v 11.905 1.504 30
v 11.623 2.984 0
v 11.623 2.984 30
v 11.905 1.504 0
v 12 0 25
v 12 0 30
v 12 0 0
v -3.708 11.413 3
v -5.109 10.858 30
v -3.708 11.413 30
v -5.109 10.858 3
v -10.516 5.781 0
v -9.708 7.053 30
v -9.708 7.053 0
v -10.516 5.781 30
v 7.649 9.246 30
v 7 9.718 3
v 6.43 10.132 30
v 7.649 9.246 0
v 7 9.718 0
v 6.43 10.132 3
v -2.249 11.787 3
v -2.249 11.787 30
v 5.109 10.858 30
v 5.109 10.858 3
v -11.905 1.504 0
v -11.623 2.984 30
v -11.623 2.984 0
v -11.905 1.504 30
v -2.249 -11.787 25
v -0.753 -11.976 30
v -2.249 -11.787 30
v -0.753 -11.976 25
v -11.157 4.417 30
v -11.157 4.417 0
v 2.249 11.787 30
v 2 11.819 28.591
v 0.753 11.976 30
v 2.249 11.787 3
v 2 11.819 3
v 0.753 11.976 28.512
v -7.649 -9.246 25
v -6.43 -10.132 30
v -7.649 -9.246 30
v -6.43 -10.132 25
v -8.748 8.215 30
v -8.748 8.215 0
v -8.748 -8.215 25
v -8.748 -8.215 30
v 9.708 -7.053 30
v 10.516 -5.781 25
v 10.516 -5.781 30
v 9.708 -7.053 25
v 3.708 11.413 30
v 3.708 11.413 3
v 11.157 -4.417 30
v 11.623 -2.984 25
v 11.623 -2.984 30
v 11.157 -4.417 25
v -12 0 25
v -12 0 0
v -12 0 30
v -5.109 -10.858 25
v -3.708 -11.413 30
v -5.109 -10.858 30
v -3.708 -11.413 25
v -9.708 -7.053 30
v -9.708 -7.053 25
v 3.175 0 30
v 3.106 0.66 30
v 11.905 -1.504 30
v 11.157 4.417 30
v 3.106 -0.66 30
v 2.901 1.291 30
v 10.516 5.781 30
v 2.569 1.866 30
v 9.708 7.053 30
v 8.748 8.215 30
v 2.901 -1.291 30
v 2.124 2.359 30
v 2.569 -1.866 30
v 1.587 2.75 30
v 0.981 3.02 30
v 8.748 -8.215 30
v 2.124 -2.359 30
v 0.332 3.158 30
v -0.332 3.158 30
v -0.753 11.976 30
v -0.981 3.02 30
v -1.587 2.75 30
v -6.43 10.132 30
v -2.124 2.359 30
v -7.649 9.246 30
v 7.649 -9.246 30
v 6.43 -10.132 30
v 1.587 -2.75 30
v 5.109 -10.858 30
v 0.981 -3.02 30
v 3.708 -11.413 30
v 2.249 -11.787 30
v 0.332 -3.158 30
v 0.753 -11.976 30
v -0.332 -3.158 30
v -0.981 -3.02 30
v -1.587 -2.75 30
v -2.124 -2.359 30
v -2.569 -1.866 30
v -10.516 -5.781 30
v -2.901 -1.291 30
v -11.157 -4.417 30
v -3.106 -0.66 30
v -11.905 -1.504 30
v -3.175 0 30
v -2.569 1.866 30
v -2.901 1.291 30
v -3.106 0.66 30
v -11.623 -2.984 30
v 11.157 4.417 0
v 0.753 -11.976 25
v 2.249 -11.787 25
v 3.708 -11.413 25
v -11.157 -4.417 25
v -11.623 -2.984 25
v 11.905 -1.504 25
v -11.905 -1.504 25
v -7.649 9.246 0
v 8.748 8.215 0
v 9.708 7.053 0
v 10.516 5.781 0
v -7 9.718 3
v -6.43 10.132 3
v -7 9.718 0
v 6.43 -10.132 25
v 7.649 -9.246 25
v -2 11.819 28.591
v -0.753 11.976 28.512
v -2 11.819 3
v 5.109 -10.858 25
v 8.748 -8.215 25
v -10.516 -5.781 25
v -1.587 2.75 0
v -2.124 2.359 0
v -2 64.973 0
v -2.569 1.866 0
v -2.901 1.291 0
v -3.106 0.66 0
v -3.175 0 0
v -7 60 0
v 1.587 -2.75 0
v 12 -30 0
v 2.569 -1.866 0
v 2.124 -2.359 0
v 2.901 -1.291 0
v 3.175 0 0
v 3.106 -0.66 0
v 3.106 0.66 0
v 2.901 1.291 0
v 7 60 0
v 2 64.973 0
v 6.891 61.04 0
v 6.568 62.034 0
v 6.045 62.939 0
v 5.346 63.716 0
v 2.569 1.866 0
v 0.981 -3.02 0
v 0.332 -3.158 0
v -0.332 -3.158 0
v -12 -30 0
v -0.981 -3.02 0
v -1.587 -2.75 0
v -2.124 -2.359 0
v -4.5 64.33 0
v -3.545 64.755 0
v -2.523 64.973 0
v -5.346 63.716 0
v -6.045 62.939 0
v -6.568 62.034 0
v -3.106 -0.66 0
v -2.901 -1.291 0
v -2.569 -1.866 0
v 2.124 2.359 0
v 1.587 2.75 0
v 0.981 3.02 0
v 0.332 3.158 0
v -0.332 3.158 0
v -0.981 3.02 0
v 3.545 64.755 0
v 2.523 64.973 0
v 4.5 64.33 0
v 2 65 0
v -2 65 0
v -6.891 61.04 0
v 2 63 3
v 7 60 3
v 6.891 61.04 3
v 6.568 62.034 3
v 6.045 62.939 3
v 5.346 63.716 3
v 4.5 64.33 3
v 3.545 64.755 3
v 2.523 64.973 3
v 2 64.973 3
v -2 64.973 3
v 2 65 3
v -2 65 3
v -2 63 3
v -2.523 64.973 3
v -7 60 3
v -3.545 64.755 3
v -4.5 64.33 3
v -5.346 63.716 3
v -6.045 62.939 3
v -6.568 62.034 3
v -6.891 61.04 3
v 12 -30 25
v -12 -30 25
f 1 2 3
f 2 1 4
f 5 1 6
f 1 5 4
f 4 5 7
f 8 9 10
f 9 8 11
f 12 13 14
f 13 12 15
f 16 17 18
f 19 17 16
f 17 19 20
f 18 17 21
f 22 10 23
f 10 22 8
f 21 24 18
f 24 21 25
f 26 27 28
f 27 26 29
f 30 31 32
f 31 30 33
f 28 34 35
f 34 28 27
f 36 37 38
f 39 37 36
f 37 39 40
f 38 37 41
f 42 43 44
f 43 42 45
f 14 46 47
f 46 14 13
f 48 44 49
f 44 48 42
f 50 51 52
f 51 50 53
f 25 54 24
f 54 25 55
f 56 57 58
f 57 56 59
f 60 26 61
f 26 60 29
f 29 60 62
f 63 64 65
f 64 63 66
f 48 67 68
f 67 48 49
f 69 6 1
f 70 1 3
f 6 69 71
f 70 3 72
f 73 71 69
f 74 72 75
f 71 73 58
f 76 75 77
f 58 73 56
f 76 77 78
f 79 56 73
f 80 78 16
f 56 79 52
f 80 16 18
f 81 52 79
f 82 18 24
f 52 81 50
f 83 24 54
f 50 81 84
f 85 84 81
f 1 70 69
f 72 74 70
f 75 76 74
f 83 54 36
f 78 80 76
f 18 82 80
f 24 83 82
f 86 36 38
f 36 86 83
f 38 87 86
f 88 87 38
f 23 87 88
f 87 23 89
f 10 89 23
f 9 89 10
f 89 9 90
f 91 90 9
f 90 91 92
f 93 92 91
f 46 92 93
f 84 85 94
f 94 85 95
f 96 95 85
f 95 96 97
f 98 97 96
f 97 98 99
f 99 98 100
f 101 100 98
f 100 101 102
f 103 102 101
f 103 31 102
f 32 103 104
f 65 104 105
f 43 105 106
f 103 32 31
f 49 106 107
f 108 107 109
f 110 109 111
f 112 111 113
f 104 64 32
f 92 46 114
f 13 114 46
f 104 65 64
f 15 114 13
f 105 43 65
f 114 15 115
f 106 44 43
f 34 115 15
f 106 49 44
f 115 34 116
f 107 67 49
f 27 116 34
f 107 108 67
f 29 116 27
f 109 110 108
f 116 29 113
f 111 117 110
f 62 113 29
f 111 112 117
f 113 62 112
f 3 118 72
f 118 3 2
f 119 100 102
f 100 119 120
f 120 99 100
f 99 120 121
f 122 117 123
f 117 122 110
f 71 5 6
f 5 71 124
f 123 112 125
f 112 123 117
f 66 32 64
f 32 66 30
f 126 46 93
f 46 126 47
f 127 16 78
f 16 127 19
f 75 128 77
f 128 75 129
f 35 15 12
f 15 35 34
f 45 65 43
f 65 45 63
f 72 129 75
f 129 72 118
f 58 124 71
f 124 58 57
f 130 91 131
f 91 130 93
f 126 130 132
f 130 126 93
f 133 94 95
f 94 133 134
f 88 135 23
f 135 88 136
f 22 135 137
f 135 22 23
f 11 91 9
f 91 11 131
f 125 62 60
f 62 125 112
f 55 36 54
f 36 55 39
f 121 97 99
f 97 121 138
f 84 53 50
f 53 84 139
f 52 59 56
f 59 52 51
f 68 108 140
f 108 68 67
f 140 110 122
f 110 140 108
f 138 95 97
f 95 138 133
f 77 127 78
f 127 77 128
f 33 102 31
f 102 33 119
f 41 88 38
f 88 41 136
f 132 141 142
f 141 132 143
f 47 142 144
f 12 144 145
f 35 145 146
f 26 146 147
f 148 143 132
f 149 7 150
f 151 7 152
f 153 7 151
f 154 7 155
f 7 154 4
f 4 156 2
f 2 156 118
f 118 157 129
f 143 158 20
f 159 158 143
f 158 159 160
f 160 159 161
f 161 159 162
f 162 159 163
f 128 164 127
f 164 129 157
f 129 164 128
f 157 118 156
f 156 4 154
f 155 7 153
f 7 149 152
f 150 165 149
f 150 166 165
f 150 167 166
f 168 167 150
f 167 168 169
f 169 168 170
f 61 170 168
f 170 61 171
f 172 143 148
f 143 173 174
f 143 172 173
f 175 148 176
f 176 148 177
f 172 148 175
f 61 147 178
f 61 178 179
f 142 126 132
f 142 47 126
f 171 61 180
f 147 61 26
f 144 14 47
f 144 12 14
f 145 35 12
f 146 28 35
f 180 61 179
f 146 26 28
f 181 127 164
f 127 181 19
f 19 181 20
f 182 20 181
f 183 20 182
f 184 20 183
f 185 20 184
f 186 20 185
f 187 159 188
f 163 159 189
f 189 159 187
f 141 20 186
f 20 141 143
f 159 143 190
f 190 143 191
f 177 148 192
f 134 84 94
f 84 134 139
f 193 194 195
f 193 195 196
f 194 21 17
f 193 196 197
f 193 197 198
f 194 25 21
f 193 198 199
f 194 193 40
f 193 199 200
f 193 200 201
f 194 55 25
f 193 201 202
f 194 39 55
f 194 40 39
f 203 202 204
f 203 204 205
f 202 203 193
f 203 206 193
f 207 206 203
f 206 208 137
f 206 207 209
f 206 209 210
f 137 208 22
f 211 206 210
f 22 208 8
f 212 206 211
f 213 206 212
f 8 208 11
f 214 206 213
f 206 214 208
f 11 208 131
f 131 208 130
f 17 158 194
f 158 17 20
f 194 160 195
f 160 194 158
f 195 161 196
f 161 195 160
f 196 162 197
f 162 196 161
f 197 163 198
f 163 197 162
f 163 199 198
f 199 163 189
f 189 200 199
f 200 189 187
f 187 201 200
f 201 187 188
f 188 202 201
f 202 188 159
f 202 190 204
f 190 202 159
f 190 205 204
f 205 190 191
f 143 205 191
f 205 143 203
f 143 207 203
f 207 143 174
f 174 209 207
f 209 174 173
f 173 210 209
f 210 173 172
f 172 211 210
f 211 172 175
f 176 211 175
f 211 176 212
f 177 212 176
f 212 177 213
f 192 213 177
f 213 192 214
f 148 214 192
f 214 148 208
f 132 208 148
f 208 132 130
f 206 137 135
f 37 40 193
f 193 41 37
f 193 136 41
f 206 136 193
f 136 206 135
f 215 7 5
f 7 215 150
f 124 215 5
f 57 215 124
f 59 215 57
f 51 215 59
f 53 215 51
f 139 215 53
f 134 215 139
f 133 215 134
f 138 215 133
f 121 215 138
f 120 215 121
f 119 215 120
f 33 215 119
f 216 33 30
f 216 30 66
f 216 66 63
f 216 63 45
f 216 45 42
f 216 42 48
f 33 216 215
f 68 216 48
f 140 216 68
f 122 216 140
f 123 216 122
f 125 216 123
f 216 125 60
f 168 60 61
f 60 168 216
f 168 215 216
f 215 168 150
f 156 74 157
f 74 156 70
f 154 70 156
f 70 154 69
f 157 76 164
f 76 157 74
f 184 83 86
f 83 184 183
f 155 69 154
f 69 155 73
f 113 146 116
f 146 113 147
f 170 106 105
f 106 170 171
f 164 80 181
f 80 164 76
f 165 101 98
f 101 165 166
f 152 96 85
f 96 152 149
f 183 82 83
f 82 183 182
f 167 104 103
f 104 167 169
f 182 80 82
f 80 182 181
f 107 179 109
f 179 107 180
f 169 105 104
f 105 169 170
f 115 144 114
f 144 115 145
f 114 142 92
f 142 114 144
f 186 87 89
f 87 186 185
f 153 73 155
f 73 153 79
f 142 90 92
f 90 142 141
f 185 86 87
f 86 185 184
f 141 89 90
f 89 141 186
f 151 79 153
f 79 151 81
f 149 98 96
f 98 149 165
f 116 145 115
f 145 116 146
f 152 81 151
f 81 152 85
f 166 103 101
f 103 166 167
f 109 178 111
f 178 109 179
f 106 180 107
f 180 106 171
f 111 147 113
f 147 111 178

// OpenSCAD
boltd=inches(1/4);
nutd=0;//boltd/sin(30);
nuth=5;
bigh=30;
bigd=24;
drop=30;
dropt=25;
wipew=14;
wipeh=65;
wipet=3;
echo(str("Diameters: Bolt:",boltd," Nut:",nutd));
difference() {
  union() {
    cylinder(d=bigd,h=bigh,$fn=50);
    translate([-wipew/2,0]) rcube([wipew,wipeh,wipet]);
    translate([-2,9]) rotate([0,90,0]) linear_extrude(4) polygon([[0,0],[-bigh,0],[-wipet,wipeh-11]]);
    translate([bigd/-2,-drop]) cube([bigd,drop,dropt]);
  }
  translate([0,0,-.01]) cylinder(d=boltd,h=bigh+.02,$fn=30);
  translate([0,0,bigh-nuth]) cylinder(d=nutd,h=nuth+.02,$fn=6);
}

module mirrorx(off=0) {
  translate([off/-2,0]) for(m=[0,1]) mirror([m,0]) translate([off/2,0]) children();
}
module mirrory(off=0)
{
  translate([0,off/-2]) for(m=[0,1]) mirror([0,m]) translate([0,off/2]) children();
}
module mirrorz(off=0)
{
  translate([0,0,off/2]) for(m=[0,1]) mirror([0,0,m]) translate([0,0,off/-2]) children();
}
module rsquare(dims,r=5,center=false,$fn=30)
{
  translate(center?[dims[0]/-2,dims[1]/-2]:[0,0])
  hull() for(x=[r,dims[0]-r],y=[r,dims[1]-r]) translate([x,y]) circle(r=r,$fn=$fn);
}
module rcube(dims,r=5,$fn=30)
{
  linear_extrude(dims[2],convexity=3) {
    for(x=[r,dims[0]-r],y=[r,dims[1]-r])
      translate([x,y]) circle(r=r,$fn=$fn);
    translate([0,r]) square([dims[0],dims[1]-r*2]);
    translate([r,0]) square([dims[0]-r*2,dims[1]]);
  }
}
module cube2(dims,r=5,$fn=30)
{
  minkowski() {
    translate([r,r,r]) cube([dims[0]-r*2,dims[1]-r*2,dims[2]-r*2]);
    sphere(r=r,$fn=$fn);
  }
}

function inches(in) = 25.4 * in;
